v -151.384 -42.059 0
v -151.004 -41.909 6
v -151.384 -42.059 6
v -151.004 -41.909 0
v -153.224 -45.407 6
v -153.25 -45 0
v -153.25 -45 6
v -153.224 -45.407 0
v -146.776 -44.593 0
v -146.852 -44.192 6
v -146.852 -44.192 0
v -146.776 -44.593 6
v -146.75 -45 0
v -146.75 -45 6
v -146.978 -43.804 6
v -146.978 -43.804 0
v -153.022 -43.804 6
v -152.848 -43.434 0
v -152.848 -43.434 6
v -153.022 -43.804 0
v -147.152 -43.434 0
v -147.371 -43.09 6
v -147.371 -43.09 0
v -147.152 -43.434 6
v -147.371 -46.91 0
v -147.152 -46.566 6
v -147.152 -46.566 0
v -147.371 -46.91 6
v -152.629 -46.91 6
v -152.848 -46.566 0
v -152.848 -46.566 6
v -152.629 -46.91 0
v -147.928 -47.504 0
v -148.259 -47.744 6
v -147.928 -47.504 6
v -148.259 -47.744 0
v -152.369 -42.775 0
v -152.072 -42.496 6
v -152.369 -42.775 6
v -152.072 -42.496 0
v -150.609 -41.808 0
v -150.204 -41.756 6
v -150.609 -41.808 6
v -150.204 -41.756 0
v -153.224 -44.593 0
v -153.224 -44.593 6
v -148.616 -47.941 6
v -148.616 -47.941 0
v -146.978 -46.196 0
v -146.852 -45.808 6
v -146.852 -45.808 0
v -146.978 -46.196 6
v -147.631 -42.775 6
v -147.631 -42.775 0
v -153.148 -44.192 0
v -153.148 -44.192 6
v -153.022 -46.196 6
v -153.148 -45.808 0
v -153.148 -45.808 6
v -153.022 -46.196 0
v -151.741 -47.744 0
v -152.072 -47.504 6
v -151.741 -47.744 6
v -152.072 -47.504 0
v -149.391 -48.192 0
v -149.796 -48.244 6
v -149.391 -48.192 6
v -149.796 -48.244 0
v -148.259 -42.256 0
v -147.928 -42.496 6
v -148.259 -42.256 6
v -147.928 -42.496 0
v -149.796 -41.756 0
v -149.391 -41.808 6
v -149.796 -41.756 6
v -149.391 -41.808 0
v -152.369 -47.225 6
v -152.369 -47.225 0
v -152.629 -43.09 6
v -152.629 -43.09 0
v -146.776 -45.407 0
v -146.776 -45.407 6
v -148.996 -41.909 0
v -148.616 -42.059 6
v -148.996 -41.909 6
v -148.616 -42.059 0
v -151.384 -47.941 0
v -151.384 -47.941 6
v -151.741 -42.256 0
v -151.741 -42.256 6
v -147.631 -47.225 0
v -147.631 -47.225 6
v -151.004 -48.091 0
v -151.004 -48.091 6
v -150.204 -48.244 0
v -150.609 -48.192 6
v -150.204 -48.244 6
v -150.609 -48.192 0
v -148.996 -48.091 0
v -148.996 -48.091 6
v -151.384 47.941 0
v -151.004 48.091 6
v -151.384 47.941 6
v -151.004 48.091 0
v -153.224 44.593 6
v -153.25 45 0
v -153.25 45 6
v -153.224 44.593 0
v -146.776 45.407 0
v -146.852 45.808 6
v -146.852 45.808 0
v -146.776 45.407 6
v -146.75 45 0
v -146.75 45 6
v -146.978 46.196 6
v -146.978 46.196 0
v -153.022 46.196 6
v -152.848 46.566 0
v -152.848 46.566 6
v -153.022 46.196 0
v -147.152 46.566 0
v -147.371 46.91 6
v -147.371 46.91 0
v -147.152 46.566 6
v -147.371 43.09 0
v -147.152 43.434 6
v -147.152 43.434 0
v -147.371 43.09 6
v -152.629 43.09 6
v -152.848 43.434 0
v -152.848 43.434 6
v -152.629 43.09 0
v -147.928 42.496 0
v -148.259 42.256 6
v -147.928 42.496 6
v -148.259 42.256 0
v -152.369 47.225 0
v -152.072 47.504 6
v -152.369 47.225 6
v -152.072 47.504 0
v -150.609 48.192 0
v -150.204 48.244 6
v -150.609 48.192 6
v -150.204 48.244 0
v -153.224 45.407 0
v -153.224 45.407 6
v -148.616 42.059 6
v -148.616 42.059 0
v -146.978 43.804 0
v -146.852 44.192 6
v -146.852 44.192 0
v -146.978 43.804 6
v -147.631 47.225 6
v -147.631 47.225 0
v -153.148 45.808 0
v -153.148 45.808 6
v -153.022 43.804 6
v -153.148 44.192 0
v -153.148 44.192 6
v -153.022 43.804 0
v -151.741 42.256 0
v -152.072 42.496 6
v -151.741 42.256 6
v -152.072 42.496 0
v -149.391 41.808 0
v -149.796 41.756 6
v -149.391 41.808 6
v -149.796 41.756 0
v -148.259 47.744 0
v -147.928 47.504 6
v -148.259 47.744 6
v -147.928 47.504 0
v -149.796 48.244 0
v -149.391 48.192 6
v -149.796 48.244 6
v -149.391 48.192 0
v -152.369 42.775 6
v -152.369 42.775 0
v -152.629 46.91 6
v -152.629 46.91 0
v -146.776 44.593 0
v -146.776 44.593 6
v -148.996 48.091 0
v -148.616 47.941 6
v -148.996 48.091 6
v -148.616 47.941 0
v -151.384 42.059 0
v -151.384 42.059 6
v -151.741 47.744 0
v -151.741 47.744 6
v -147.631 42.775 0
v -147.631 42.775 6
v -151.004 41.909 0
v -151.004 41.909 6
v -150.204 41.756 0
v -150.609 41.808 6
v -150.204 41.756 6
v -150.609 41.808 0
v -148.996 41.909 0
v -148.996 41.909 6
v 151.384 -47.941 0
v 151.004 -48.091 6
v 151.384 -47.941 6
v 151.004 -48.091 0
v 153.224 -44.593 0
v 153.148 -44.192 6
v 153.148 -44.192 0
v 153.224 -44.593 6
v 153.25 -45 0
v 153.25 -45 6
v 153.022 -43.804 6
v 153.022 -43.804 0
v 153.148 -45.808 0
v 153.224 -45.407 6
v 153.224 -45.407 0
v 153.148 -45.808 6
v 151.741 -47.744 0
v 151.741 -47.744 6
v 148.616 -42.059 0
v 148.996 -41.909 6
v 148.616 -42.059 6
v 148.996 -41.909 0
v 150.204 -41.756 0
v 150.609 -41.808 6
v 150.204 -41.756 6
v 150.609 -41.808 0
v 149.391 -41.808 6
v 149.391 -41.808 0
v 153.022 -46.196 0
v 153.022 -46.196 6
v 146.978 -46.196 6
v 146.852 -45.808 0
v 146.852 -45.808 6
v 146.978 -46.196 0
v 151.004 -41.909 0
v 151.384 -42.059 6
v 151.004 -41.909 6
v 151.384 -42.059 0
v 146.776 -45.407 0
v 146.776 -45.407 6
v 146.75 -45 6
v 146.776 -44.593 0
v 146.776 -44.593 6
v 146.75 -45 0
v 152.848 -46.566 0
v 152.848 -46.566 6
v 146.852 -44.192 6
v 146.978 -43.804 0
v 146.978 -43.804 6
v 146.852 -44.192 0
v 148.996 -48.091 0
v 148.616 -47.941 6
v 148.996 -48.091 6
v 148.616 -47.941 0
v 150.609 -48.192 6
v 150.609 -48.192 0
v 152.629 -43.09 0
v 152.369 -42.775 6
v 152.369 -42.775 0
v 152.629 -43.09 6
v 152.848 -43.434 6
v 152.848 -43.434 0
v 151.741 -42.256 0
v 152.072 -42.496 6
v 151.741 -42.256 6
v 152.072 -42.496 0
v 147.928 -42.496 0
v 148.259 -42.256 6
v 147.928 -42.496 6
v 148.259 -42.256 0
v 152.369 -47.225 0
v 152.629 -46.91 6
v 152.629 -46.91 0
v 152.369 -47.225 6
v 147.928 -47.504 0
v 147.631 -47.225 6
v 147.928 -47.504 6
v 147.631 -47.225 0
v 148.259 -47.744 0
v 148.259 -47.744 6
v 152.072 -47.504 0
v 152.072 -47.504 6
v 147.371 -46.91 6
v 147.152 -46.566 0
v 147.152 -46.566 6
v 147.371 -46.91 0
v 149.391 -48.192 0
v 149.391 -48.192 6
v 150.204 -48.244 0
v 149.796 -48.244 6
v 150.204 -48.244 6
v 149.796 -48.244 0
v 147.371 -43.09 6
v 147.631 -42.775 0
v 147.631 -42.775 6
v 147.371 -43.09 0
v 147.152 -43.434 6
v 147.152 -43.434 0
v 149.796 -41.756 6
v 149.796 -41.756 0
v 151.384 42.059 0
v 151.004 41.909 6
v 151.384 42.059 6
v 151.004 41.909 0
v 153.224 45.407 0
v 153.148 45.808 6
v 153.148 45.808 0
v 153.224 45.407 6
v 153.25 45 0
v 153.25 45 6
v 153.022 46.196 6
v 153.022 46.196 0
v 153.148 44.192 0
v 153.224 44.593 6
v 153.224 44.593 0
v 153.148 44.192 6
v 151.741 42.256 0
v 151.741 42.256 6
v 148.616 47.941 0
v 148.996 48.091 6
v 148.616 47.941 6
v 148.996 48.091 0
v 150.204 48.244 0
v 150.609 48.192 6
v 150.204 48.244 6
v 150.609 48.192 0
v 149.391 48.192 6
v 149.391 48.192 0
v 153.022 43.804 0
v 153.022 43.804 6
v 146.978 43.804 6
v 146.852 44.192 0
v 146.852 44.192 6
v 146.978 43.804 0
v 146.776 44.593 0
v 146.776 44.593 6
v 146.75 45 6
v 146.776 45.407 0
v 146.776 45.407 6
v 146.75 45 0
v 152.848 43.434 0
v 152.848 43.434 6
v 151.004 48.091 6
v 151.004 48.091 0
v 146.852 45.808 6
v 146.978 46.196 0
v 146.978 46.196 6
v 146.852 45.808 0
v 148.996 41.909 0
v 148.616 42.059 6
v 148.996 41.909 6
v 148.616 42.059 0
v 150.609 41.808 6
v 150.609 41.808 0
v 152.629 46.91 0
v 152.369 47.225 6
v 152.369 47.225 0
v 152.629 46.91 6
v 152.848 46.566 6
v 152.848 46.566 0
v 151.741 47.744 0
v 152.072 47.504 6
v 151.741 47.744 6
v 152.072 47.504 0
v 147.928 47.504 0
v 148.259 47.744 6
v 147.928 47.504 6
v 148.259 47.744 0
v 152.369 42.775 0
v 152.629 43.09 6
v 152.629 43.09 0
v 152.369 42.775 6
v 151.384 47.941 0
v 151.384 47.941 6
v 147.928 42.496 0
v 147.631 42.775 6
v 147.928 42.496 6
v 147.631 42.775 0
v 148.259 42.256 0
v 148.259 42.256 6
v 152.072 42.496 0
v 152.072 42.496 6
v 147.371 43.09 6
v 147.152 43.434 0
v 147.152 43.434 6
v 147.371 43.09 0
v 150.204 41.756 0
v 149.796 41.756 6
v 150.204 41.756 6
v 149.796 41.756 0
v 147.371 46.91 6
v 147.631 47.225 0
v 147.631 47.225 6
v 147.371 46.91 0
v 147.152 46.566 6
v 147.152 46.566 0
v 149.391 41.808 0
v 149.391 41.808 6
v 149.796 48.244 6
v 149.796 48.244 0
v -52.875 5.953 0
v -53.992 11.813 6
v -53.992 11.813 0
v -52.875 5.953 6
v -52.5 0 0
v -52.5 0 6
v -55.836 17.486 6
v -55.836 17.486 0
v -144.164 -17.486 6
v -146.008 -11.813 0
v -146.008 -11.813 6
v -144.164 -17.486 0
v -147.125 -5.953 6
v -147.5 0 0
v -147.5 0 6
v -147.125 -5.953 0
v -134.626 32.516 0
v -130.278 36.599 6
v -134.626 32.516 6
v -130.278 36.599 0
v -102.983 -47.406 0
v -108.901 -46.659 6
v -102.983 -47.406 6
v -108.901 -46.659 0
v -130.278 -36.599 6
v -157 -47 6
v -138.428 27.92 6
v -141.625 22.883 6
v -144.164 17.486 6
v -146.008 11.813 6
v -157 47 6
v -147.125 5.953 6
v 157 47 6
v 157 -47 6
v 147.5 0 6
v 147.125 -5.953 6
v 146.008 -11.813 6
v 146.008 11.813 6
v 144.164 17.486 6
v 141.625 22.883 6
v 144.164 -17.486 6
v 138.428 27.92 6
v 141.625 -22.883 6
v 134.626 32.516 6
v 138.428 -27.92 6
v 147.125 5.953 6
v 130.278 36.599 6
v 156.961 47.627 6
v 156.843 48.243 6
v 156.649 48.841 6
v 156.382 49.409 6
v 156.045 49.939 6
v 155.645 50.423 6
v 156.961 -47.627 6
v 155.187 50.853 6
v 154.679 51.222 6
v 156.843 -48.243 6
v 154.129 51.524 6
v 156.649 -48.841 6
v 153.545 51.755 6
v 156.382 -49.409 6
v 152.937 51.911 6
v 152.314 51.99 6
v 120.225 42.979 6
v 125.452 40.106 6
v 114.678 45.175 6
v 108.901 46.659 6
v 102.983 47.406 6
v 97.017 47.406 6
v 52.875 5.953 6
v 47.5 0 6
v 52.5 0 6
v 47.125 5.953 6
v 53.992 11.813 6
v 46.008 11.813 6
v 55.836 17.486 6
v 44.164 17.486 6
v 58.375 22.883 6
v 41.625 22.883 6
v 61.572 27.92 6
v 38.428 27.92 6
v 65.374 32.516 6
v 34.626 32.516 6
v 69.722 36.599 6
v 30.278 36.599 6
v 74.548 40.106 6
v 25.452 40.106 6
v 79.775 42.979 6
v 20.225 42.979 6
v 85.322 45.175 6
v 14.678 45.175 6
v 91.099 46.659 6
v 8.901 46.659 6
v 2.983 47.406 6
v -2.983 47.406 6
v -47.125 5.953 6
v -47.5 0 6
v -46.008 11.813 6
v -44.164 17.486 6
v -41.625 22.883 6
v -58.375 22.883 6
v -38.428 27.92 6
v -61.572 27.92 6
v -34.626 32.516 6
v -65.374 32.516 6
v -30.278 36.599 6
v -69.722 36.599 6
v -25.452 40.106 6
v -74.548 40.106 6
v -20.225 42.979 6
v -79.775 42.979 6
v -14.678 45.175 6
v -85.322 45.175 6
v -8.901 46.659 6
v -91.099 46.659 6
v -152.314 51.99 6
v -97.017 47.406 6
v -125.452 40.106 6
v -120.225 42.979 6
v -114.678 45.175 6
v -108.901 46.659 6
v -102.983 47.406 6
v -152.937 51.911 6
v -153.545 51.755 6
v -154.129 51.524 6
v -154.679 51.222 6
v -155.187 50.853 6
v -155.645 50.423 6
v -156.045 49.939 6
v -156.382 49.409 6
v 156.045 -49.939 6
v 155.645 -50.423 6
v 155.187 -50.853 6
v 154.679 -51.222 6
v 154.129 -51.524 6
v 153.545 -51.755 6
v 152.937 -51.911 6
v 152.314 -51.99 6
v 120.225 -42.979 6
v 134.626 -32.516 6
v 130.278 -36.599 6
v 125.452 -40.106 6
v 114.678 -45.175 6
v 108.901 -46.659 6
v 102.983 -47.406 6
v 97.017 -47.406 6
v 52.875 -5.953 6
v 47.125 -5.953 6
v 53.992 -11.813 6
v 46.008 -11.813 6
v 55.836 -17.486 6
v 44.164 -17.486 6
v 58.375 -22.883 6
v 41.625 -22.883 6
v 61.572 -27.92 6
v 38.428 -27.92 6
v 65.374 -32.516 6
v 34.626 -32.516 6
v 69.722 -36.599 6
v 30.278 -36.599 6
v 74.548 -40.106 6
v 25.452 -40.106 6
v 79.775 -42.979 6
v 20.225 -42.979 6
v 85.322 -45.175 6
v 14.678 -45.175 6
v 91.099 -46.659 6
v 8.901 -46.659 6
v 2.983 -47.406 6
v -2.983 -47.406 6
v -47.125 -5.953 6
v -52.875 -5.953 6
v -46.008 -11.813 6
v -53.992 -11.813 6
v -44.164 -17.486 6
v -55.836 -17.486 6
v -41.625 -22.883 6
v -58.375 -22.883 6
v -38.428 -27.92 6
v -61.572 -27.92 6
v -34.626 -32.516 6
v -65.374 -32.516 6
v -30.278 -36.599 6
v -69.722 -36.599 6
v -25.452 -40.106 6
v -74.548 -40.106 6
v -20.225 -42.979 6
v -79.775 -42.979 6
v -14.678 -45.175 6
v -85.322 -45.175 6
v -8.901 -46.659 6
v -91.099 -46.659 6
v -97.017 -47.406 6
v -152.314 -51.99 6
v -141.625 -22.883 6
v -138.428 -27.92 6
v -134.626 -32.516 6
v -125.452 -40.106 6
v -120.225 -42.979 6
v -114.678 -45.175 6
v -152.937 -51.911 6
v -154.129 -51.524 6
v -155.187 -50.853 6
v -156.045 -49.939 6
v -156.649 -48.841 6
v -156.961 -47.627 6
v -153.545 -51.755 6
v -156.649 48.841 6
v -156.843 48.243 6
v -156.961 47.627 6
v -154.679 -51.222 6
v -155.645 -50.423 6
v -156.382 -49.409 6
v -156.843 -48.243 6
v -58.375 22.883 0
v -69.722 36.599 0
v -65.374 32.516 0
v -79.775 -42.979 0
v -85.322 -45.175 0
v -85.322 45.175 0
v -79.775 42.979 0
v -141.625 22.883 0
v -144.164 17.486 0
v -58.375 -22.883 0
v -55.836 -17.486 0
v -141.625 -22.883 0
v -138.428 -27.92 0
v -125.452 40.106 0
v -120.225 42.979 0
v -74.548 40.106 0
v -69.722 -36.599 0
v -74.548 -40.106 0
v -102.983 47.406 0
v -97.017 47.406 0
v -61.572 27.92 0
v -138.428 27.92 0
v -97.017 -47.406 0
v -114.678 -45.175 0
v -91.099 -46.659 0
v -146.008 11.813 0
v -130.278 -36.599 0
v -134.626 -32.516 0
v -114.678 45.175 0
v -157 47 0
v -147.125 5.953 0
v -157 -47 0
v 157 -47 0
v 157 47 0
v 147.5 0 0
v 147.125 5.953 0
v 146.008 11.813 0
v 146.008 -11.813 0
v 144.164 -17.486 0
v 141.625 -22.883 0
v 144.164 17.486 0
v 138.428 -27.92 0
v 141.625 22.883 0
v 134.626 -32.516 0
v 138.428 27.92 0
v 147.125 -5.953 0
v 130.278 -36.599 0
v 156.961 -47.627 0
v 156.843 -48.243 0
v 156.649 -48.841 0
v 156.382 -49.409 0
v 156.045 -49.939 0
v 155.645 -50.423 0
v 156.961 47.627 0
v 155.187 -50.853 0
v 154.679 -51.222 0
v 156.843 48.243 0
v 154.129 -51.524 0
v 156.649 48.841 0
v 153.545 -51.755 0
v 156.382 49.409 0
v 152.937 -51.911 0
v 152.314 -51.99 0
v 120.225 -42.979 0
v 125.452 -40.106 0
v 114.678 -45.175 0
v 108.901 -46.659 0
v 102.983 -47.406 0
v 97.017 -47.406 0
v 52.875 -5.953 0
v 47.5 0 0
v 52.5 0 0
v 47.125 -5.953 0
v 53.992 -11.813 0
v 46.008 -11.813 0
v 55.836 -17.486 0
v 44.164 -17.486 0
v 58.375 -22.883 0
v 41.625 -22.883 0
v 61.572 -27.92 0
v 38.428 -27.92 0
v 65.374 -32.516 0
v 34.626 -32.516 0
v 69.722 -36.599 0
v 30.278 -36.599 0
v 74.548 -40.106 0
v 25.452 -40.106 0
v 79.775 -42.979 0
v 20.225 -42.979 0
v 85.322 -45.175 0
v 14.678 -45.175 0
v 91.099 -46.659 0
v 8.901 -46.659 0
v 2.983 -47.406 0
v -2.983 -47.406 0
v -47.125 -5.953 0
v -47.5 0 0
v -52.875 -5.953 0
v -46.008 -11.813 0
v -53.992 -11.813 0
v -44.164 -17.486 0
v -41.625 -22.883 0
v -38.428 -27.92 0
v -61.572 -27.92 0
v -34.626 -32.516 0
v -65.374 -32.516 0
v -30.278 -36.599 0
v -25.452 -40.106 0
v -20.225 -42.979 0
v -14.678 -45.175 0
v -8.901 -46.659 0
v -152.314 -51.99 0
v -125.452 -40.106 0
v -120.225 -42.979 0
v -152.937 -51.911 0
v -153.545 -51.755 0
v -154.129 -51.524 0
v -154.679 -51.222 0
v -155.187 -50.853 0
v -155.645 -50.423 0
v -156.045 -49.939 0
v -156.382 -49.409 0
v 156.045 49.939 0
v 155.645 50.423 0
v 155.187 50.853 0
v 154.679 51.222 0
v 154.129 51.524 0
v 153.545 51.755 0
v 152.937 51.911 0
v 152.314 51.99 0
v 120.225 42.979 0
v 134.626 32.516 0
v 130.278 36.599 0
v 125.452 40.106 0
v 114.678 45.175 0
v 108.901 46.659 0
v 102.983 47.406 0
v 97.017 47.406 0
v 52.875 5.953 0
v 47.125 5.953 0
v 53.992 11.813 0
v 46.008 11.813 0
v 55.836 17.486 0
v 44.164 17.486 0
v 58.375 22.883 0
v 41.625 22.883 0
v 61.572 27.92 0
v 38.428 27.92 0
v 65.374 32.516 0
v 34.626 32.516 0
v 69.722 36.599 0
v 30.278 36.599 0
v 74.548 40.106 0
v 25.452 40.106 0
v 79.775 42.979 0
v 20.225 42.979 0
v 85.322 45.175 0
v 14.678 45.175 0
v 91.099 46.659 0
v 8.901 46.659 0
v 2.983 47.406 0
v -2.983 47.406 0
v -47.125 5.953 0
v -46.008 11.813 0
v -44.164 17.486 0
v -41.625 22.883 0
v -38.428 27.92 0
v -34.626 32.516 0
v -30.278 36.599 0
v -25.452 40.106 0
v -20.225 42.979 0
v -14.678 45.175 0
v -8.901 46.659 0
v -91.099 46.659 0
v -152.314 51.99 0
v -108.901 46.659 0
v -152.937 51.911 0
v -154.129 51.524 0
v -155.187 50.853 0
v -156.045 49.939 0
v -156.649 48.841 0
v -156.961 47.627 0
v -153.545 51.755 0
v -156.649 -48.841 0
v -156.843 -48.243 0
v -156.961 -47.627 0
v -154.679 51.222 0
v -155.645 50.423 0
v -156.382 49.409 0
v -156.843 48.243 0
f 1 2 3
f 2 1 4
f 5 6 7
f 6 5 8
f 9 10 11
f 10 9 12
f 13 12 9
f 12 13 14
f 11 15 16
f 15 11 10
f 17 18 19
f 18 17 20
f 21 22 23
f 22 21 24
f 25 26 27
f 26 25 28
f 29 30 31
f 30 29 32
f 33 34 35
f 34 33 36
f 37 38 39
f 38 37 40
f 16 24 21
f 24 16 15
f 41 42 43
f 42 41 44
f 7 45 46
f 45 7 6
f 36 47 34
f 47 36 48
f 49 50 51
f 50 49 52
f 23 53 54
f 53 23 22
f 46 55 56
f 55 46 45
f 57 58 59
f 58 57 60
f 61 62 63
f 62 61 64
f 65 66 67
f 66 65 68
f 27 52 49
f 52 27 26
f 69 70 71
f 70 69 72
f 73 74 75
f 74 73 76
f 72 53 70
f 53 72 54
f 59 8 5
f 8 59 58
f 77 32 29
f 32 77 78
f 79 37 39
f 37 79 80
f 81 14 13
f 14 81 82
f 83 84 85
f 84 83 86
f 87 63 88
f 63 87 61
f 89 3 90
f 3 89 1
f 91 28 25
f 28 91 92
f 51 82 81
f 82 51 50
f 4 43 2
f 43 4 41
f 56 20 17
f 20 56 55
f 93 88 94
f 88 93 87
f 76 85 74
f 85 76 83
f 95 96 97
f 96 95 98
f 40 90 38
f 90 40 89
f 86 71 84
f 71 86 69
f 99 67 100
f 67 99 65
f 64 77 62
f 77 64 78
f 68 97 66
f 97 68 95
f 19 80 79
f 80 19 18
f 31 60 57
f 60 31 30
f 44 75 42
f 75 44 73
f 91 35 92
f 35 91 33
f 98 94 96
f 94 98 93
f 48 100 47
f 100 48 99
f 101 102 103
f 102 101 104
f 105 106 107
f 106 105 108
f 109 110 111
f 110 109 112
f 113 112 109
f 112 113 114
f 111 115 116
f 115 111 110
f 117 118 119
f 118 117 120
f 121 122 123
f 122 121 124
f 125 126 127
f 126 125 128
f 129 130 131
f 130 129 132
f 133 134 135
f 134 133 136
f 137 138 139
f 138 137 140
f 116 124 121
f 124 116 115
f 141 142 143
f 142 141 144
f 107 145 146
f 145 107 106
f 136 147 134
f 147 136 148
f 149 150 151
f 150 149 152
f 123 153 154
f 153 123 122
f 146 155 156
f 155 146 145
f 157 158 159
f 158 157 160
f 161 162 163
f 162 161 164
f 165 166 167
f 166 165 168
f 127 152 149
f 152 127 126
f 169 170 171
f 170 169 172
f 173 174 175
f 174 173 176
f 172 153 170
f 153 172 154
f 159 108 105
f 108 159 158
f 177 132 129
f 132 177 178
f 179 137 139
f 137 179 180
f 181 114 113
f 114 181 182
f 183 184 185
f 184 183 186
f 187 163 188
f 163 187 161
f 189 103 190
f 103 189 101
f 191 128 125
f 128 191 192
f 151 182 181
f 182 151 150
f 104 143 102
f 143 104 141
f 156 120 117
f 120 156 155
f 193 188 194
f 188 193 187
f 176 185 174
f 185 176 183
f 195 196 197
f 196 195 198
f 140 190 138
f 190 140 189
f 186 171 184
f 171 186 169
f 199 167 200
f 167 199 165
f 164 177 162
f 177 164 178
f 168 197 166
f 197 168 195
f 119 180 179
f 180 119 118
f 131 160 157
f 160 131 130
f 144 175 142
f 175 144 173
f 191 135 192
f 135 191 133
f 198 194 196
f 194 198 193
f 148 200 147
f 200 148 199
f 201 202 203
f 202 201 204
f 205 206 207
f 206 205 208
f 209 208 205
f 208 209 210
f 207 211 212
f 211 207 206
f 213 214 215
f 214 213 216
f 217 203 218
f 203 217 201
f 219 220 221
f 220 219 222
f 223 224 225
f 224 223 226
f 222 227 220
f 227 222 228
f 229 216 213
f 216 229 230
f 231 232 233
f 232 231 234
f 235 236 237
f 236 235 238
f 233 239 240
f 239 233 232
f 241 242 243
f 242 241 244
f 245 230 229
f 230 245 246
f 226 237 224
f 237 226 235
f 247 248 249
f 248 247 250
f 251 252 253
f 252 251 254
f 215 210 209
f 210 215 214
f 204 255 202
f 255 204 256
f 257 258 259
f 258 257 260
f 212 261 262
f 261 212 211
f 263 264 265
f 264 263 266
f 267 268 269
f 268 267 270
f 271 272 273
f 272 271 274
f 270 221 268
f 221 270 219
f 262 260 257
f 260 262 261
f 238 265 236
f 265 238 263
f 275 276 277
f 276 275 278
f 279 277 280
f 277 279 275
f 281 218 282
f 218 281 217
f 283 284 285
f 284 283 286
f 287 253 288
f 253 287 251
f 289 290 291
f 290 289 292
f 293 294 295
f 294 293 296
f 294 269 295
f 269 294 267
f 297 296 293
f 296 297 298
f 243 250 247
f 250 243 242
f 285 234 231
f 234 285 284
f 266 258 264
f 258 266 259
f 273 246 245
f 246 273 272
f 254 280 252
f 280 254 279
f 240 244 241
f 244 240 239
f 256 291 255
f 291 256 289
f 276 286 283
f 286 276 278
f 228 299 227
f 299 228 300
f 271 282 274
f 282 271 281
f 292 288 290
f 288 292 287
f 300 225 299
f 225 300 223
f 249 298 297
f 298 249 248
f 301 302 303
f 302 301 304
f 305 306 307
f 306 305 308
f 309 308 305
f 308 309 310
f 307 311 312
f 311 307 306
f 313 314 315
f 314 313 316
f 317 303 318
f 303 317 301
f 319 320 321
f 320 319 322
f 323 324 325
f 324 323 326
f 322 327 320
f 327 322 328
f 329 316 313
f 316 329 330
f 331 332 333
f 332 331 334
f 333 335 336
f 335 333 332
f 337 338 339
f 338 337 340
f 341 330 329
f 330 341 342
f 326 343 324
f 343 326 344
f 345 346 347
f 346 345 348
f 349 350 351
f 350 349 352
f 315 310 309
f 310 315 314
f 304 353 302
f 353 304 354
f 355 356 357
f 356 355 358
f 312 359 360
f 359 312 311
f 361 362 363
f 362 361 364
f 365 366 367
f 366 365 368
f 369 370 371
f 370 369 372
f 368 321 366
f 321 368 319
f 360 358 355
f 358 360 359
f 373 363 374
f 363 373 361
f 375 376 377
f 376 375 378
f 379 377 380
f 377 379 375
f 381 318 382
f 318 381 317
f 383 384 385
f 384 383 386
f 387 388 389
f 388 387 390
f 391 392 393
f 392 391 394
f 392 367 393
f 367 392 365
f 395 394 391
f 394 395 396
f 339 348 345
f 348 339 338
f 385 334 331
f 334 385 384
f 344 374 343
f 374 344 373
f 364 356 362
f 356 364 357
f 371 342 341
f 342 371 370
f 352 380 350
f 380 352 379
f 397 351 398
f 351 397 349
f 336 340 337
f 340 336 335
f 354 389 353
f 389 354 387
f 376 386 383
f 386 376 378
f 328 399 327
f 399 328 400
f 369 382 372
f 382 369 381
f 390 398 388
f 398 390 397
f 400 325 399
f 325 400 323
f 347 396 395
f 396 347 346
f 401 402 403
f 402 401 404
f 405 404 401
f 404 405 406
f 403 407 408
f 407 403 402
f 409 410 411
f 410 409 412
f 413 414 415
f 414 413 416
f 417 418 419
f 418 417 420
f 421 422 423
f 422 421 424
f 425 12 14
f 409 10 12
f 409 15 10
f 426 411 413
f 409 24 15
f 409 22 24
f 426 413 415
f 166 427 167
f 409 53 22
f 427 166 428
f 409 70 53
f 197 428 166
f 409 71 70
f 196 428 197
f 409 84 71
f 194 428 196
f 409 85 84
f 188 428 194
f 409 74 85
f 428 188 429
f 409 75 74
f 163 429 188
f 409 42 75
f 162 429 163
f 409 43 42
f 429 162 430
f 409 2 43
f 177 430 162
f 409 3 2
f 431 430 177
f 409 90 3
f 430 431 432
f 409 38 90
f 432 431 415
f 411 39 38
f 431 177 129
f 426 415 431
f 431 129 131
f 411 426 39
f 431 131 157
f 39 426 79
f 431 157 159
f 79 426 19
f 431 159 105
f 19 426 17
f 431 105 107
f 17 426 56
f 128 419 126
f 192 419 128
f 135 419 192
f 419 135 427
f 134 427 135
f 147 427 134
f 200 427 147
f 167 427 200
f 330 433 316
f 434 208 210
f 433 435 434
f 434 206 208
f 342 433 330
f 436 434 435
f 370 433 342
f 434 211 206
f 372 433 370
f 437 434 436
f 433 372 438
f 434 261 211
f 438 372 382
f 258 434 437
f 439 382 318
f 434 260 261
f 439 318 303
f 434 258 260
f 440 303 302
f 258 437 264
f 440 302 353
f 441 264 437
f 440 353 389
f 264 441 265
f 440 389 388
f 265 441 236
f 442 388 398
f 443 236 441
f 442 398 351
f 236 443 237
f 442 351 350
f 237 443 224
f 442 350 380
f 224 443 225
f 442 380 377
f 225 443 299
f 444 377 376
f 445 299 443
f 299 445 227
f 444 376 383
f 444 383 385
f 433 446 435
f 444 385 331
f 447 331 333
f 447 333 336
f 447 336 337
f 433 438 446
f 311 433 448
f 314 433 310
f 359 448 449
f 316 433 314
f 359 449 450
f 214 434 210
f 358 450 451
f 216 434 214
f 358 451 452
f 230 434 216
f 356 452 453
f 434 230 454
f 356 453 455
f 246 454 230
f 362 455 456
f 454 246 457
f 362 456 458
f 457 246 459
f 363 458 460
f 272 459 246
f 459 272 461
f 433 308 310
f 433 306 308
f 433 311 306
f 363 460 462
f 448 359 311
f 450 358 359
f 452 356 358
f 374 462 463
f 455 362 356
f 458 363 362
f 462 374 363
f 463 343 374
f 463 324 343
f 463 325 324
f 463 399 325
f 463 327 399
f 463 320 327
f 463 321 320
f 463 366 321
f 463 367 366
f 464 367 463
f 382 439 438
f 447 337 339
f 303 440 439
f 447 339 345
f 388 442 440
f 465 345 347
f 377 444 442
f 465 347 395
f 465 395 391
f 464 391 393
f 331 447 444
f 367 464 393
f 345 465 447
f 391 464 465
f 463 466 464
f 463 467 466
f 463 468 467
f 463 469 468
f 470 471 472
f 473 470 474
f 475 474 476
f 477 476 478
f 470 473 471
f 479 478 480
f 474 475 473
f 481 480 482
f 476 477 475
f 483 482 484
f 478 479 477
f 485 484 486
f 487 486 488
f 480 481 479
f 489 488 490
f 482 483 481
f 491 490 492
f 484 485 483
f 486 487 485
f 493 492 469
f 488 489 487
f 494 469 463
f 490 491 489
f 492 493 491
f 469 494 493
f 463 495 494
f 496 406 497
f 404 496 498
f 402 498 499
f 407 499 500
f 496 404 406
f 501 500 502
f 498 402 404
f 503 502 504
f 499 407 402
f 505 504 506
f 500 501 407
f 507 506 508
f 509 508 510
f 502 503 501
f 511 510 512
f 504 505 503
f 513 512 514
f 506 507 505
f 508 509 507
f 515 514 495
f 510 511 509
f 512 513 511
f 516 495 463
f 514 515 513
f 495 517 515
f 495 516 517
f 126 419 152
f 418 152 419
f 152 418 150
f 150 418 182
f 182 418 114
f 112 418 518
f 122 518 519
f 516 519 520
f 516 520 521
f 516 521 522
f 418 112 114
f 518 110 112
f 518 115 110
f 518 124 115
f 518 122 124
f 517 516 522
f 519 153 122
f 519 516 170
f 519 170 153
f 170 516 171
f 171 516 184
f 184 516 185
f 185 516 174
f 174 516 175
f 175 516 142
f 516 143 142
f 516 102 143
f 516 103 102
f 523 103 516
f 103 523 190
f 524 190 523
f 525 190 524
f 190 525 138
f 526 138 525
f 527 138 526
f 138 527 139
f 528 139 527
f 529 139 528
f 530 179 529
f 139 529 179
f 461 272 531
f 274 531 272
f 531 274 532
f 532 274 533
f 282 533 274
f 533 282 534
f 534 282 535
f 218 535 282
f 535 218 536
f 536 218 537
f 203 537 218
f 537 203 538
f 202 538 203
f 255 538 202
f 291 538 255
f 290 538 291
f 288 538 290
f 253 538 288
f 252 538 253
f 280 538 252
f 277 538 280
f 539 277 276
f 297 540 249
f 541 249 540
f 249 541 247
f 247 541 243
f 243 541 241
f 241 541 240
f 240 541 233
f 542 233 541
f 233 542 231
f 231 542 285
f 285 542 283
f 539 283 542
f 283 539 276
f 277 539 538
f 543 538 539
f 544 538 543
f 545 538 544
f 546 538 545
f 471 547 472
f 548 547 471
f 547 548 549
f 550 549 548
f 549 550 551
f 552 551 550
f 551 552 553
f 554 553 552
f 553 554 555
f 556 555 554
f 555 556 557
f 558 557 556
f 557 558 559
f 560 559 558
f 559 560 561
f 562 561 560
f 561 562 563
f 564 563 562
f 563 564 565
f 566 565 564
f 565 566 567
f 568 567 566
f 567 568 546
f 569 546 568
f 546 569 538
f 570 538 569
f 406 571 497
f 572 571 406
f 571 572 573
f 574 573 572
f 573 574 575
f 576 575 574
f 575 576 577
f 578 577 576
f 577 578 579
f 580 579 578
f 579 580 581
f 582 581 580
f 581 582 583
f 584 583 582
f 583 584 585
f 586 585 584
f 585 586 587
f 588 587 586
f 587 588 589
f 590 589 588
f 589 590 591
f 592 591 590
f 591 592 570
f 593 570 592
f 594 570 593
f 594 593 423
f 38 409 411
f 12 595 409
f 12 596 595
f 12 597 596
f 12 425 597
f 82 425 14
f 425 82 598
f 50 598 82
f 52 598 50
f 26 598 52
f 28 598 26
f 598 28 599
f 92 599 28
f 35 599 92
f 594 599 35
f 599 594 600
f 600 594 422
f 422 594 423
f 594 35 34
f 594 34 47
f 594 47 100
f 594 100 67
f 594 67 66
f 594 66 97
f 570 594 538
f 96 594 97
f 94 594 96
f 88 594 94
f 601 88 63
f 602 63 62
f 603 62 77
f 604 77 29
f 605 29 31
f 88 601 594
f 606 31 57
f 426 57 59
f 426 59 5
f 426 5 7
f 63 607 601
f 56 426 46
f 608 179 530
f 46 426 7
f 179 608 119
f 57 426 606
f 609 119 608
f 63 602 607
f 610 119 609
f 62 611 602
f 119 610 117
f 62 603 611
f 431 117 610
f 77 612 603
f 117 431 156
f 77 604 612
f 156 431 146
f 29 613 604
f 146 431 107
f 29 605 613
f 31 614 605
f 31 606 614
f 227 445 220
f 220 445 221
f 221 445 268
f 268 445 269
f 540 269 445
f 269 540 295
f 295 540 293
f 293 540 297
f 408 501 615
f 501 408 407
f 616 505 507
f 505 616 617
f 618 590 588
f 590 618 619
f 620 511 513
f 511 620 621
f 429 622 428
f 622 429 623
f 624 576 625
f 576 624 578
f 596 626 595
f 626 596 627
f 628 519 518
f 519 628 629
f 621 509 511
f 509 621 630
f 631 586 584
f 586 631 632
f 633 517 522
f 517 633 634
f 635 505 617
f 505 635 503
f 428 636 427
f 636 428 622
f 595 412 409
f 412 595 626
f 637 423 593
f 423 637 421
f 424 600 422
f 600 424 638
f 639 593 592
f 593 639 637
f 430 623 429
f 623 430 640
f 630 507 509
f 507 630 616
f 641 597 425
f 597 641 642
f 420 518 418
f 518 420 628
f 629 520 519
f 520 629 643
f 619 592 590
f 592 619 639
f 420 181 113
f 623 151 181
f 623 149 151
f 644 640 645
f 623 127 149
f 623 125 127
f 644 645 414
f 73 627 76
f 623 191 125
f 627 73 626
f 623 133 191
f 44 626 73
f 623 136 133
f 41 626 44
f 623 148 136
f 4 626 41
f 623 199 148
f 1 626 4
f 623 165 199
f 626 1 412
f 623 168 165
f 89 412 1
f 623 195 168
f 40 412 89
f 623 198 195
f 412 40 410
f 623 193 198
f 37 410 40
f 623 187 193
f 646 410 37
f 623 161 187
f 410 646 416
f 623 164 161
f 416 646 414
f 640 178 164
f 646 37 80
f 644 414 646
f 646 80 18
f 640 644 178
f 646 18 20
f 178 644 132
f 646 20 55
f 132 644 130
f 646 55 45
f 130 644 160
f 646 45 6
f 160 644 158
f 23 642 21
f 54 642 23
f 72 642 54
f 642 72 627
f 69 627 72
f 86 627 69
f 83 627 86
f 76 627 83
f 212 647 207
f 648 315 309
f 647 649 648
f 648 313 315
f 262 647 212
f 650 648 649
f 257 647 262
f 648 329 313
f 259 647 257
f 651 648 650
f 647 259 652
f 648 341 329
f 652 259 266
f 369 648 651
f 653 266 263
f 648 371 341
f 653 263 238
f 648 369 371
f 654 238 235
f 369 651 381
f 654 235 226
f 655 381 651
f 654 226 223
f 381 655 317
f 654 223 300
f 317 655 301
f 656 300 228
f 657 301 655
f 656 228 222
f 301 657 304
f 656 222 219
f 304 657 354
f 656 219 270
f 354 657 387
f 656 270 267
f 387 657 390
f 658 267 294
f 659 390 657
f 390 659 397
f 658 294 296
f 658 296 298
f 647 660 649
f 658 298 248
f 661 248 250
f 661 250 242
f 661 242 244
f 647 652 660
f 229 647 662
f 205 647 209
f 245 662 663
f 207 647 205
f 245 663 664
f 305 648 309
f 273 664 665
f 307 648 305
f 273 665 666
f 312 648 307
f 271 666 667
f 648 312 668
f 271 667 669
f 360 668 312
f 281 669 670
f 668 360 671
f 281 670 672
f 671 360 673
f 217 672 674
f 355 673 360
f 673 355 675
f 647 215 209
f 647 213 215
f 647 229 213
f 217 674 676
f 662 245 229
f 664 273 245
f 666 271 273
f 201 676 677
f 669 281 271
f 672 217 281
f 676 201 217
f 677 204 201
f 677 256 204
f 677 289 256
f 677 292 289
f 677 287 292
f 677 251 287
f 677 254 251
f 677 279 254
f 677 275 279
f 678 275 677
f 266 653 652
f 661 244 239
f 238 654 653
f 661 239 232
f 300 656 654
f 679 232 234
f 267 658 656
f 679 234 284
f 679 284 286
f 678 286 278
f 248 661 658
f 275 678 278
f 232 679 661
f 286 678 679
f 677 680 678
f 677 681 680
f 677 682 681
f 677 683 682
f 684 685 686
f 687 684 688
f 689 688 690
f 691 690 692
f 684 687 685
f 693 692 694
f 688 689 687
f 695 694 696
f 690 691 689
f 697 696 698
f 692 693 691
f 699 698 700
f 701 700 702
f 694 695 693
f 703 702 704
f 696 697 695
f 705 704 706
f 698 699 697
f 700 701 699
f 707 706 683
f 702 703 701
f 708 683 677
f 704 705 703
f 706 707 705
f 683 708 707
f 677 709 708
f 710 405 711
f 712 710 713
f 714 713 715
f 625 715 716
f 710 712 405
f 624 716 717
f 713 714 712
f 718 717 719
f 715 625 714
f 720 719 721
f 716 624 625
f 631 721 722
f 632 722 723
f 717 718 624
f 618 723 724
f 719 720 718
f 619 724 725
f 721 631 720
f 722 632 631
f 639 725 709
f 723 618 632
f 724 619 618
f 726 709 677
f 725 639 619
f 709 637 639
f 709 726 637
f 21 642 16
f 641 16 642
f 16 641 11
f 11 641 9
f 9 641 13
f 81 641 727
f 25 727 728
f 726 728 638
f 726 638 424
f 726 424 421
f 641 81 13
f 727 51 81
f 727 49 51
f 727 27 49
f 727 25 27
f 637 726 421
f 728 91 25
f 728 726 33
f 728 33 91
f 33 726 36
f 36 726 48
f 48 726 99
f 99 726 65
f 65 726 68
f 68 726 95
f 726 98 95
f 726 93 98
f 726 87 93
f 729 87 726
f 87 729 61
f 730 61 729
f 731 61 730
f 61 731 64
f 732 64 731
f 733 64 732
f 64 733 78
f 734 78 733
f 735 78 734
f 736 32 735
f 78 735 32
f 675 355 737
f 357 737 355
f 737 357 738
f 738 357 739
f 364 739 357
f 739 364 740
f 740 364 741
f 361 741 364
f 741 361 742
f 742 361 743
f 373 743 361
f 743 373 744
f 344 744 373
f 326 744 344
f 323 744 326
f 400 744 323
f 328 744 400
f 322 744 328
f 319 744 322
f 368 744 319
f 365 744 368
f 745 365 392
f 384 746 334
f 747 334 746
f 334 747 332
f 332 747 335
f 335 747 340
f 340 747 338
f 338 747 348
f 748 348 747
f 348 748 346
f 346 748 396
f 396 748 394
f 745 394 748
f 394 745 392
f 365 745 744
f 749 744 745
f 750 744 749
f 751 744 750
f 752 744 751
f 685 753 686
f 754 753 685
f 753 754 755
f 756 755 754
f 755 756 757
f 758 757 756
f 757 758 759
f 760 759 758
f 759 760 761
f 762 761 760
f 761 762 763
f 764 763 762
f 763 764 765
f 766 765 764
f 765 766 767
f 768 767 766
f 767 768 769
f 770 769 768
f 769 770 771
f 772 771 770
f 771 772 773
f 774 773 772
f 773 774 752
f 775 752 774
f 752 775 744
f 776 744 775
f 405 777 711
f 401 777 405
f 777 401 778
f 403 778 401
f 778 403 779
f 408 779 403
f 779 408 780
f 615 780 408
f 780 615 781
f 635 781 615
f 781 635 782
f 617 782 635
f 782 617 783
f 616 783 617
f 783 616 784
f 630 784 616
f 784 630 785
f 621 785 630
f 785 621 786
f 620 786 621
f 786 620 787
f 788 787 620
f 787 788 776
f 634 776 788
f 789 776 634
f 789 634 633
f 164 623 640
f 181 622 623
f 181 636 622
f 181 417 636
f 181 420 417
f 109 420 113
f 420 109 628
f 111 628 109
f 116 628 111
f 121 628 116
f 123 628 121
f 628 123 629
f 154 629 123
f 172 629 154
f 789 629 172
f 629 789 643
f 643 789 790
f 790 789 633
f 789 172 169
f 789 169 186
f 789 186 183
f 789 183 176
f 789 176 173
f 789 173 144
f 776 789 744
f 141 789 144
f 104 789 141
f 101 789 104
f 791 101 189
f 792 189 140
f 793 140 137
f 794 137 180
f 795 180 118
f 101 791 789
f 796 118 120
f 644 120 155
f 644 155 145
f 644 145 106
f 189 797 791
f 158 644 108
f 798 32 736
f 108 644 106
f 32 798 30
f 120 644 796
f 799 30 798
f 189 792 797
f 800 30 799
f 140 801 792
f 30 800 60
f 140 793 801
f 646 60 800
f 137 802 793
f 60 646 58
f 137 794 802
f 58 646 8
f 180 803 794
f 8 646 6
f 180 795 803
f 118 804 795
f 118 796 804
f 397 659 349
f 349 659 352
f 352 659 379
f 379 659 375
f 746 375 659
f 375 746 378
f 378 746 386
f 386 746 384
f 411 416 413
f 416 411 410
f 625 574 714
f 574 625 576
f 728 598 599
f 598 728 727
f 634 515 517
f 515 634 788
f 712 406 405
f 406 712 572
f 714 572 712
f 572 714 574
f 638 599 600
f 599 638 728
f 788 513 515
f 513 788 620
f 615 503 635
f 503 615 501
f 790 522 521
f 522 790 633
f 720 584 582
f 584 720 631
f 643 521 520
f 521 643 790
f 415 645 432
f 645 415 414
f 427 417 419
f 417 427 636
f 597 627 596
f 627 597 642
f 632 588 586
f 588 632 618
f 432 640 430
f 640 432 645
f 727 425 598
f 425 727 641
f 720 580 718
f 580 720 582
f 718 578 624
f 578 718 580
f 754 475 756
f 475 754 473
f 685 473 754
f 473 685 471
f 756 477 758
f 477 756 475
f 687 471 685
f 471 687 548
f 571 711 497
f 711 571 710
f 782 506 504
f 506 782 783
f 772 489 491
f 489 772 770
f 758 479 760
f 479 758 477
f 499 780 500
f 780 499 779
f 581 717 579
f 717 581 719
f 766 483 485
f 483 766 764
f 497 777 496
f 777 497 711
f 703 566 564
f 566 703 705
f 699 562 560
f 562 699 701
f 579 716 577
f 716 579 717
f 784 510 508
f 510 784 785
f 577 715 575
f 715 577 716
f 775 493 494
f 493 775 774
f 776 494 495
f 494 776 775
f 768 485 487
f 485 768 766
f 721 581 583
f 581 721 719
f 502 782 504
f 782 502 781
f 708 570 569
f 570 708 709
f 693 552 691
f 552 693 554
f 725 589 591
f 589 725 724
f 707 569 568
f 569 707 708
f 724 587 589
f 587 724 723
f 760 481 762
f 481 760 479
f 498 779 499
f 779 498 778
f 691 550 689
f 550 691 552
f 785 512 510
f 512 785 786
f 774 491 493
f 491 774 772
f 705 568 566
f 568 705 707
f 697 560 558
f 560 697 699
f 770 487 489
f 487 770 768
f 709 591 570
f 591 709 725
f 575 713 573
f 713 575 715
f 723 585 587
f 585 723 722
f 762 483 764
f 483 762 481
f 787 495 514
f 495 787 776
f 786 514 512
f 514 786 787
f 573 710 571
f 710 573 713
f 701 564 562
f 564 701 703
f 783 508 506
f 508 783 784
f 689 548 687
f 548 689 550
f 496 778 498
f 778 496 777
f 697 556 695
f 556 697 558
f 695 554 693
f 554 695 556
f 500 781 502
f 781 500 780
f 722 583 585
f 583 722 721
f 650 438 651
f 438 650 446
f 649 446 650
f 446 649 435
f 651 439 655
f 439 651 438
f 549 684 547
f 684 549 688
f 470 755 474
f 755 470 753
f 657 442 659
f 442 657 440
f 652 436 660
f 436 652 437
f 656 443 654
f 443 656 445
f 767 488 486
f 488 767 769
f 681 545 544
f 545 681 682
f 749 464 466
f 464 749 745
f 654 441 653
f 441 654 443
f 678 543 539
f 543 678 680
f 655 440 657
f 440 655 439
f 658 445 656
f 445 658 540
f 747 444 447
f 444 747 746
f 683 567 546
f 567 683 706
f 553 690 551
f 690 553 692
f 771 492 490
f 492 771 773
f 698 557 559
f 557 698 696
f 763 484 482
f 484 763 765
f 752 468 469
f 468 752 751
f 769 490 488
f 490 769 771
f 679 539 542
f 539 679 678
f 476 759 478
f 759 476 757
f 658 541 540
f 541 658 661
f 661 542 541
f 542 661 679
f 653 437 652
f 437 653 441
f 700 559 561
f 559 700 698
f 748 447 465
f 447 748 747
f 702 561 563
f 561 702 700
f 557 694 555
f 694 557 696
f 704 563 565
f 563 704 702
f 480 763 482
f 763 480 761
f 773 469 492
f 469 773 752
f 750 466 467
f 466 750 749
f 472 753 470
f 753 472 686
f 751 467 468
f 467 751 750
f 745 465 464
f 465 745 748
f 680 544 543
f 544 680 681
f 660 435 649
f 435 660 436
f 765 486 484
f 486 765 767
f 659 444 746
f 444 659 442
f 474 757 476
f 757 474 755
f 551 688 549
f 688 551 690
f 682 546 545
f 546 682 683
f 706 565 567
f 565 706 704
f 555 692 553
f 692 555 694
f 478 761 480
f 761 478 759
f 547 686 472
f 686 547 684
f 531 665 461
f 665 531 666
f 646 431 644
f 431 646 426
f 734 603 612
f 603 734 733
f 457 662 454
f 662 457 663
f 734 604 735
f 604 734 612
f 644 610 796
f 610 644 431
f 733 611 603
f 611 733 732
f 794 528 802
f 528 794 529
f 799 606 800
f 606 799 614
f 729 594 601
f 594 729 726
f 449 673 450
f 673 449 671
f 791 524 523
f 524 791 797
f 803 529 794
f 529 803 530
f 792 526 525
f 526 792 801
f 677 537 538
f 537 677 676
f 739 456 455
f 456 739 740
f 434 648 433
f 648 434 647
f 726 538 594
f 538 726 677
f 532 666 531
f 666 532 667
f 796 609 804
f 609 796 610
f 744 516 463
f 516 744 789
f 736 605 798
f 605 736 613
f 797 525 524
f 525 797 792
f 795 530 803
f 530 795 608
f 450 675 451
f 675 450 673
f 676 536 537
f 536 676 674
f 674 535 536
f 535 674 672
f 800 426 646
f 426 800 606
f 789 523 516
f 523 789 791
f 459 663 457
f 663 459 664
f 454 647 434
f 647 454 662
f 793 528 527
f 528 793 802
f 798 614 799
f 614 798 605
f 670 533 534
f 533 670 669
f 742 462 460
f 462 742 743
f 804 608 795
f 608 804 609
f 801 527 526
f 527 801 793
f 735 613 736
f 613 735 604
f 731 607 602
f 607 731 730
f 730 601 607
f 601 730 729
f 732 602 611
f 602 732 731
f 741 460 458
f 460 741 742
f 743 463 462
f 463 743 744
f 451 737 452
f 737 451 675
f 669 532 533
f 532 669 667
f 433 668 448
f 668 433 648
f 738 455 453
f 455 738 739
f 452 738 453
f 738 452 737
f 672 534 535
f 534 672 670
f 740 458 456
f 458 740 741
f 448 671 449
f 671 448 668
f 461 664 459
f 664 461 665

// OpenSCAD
$fn = 50;


difference() {
	union() {
		hull() {
			translate(v = [-152.0000000000, 47.0000000000, 0]) {
				cylinder(h = 6, r = 5);
			}
			translate(v = [152.0000000000, 47.0000000000, 0]) {
				cylinder(h = 6, r = 5);
			}
			translate(v = [-152.0000000000, -47.0000000000, 0]) {
				cylinder(h = 6, r = 5);
			}
			translate(v = [152.0000000000, -47.0000000000, 0]) {
				cylinder(h = 6, r = 5);
			}
		}
	}
	union() {
		#translate(v = [-150.0000000000, -45.0000000000, -100.0000000000]) {
			cylinder(h = 200, r = 3.2500000000);
		}
		#translate(v = [-150.0000000000, 45.0000000000, -100.0000000000]) {
			cylinder(h = 200, r = 3.2500000000);
		}
		#translate(v = [150.0000000000, -45.0000000000, -100.0000000000]) {
			cylinder(h = 200, r = 3.2500000000);
		}
		#translate(v = [150.0000000000, 45.0000000000, -100.0000000000]) {
			cylinder(h = 200, r = 3.2500000000);
		}
		#translate(v = [-100.0000000000, 0, 0]) {
			cylinder(h = 6, r = 47.5000000000);
		}
		#cylinder(h = 6, r = 47.5000000000);
		#translate(v = [100.0000000000, 0, 0]) {
			cylinder(h = 6, r = 47.5000000000);
		}
	}
}
